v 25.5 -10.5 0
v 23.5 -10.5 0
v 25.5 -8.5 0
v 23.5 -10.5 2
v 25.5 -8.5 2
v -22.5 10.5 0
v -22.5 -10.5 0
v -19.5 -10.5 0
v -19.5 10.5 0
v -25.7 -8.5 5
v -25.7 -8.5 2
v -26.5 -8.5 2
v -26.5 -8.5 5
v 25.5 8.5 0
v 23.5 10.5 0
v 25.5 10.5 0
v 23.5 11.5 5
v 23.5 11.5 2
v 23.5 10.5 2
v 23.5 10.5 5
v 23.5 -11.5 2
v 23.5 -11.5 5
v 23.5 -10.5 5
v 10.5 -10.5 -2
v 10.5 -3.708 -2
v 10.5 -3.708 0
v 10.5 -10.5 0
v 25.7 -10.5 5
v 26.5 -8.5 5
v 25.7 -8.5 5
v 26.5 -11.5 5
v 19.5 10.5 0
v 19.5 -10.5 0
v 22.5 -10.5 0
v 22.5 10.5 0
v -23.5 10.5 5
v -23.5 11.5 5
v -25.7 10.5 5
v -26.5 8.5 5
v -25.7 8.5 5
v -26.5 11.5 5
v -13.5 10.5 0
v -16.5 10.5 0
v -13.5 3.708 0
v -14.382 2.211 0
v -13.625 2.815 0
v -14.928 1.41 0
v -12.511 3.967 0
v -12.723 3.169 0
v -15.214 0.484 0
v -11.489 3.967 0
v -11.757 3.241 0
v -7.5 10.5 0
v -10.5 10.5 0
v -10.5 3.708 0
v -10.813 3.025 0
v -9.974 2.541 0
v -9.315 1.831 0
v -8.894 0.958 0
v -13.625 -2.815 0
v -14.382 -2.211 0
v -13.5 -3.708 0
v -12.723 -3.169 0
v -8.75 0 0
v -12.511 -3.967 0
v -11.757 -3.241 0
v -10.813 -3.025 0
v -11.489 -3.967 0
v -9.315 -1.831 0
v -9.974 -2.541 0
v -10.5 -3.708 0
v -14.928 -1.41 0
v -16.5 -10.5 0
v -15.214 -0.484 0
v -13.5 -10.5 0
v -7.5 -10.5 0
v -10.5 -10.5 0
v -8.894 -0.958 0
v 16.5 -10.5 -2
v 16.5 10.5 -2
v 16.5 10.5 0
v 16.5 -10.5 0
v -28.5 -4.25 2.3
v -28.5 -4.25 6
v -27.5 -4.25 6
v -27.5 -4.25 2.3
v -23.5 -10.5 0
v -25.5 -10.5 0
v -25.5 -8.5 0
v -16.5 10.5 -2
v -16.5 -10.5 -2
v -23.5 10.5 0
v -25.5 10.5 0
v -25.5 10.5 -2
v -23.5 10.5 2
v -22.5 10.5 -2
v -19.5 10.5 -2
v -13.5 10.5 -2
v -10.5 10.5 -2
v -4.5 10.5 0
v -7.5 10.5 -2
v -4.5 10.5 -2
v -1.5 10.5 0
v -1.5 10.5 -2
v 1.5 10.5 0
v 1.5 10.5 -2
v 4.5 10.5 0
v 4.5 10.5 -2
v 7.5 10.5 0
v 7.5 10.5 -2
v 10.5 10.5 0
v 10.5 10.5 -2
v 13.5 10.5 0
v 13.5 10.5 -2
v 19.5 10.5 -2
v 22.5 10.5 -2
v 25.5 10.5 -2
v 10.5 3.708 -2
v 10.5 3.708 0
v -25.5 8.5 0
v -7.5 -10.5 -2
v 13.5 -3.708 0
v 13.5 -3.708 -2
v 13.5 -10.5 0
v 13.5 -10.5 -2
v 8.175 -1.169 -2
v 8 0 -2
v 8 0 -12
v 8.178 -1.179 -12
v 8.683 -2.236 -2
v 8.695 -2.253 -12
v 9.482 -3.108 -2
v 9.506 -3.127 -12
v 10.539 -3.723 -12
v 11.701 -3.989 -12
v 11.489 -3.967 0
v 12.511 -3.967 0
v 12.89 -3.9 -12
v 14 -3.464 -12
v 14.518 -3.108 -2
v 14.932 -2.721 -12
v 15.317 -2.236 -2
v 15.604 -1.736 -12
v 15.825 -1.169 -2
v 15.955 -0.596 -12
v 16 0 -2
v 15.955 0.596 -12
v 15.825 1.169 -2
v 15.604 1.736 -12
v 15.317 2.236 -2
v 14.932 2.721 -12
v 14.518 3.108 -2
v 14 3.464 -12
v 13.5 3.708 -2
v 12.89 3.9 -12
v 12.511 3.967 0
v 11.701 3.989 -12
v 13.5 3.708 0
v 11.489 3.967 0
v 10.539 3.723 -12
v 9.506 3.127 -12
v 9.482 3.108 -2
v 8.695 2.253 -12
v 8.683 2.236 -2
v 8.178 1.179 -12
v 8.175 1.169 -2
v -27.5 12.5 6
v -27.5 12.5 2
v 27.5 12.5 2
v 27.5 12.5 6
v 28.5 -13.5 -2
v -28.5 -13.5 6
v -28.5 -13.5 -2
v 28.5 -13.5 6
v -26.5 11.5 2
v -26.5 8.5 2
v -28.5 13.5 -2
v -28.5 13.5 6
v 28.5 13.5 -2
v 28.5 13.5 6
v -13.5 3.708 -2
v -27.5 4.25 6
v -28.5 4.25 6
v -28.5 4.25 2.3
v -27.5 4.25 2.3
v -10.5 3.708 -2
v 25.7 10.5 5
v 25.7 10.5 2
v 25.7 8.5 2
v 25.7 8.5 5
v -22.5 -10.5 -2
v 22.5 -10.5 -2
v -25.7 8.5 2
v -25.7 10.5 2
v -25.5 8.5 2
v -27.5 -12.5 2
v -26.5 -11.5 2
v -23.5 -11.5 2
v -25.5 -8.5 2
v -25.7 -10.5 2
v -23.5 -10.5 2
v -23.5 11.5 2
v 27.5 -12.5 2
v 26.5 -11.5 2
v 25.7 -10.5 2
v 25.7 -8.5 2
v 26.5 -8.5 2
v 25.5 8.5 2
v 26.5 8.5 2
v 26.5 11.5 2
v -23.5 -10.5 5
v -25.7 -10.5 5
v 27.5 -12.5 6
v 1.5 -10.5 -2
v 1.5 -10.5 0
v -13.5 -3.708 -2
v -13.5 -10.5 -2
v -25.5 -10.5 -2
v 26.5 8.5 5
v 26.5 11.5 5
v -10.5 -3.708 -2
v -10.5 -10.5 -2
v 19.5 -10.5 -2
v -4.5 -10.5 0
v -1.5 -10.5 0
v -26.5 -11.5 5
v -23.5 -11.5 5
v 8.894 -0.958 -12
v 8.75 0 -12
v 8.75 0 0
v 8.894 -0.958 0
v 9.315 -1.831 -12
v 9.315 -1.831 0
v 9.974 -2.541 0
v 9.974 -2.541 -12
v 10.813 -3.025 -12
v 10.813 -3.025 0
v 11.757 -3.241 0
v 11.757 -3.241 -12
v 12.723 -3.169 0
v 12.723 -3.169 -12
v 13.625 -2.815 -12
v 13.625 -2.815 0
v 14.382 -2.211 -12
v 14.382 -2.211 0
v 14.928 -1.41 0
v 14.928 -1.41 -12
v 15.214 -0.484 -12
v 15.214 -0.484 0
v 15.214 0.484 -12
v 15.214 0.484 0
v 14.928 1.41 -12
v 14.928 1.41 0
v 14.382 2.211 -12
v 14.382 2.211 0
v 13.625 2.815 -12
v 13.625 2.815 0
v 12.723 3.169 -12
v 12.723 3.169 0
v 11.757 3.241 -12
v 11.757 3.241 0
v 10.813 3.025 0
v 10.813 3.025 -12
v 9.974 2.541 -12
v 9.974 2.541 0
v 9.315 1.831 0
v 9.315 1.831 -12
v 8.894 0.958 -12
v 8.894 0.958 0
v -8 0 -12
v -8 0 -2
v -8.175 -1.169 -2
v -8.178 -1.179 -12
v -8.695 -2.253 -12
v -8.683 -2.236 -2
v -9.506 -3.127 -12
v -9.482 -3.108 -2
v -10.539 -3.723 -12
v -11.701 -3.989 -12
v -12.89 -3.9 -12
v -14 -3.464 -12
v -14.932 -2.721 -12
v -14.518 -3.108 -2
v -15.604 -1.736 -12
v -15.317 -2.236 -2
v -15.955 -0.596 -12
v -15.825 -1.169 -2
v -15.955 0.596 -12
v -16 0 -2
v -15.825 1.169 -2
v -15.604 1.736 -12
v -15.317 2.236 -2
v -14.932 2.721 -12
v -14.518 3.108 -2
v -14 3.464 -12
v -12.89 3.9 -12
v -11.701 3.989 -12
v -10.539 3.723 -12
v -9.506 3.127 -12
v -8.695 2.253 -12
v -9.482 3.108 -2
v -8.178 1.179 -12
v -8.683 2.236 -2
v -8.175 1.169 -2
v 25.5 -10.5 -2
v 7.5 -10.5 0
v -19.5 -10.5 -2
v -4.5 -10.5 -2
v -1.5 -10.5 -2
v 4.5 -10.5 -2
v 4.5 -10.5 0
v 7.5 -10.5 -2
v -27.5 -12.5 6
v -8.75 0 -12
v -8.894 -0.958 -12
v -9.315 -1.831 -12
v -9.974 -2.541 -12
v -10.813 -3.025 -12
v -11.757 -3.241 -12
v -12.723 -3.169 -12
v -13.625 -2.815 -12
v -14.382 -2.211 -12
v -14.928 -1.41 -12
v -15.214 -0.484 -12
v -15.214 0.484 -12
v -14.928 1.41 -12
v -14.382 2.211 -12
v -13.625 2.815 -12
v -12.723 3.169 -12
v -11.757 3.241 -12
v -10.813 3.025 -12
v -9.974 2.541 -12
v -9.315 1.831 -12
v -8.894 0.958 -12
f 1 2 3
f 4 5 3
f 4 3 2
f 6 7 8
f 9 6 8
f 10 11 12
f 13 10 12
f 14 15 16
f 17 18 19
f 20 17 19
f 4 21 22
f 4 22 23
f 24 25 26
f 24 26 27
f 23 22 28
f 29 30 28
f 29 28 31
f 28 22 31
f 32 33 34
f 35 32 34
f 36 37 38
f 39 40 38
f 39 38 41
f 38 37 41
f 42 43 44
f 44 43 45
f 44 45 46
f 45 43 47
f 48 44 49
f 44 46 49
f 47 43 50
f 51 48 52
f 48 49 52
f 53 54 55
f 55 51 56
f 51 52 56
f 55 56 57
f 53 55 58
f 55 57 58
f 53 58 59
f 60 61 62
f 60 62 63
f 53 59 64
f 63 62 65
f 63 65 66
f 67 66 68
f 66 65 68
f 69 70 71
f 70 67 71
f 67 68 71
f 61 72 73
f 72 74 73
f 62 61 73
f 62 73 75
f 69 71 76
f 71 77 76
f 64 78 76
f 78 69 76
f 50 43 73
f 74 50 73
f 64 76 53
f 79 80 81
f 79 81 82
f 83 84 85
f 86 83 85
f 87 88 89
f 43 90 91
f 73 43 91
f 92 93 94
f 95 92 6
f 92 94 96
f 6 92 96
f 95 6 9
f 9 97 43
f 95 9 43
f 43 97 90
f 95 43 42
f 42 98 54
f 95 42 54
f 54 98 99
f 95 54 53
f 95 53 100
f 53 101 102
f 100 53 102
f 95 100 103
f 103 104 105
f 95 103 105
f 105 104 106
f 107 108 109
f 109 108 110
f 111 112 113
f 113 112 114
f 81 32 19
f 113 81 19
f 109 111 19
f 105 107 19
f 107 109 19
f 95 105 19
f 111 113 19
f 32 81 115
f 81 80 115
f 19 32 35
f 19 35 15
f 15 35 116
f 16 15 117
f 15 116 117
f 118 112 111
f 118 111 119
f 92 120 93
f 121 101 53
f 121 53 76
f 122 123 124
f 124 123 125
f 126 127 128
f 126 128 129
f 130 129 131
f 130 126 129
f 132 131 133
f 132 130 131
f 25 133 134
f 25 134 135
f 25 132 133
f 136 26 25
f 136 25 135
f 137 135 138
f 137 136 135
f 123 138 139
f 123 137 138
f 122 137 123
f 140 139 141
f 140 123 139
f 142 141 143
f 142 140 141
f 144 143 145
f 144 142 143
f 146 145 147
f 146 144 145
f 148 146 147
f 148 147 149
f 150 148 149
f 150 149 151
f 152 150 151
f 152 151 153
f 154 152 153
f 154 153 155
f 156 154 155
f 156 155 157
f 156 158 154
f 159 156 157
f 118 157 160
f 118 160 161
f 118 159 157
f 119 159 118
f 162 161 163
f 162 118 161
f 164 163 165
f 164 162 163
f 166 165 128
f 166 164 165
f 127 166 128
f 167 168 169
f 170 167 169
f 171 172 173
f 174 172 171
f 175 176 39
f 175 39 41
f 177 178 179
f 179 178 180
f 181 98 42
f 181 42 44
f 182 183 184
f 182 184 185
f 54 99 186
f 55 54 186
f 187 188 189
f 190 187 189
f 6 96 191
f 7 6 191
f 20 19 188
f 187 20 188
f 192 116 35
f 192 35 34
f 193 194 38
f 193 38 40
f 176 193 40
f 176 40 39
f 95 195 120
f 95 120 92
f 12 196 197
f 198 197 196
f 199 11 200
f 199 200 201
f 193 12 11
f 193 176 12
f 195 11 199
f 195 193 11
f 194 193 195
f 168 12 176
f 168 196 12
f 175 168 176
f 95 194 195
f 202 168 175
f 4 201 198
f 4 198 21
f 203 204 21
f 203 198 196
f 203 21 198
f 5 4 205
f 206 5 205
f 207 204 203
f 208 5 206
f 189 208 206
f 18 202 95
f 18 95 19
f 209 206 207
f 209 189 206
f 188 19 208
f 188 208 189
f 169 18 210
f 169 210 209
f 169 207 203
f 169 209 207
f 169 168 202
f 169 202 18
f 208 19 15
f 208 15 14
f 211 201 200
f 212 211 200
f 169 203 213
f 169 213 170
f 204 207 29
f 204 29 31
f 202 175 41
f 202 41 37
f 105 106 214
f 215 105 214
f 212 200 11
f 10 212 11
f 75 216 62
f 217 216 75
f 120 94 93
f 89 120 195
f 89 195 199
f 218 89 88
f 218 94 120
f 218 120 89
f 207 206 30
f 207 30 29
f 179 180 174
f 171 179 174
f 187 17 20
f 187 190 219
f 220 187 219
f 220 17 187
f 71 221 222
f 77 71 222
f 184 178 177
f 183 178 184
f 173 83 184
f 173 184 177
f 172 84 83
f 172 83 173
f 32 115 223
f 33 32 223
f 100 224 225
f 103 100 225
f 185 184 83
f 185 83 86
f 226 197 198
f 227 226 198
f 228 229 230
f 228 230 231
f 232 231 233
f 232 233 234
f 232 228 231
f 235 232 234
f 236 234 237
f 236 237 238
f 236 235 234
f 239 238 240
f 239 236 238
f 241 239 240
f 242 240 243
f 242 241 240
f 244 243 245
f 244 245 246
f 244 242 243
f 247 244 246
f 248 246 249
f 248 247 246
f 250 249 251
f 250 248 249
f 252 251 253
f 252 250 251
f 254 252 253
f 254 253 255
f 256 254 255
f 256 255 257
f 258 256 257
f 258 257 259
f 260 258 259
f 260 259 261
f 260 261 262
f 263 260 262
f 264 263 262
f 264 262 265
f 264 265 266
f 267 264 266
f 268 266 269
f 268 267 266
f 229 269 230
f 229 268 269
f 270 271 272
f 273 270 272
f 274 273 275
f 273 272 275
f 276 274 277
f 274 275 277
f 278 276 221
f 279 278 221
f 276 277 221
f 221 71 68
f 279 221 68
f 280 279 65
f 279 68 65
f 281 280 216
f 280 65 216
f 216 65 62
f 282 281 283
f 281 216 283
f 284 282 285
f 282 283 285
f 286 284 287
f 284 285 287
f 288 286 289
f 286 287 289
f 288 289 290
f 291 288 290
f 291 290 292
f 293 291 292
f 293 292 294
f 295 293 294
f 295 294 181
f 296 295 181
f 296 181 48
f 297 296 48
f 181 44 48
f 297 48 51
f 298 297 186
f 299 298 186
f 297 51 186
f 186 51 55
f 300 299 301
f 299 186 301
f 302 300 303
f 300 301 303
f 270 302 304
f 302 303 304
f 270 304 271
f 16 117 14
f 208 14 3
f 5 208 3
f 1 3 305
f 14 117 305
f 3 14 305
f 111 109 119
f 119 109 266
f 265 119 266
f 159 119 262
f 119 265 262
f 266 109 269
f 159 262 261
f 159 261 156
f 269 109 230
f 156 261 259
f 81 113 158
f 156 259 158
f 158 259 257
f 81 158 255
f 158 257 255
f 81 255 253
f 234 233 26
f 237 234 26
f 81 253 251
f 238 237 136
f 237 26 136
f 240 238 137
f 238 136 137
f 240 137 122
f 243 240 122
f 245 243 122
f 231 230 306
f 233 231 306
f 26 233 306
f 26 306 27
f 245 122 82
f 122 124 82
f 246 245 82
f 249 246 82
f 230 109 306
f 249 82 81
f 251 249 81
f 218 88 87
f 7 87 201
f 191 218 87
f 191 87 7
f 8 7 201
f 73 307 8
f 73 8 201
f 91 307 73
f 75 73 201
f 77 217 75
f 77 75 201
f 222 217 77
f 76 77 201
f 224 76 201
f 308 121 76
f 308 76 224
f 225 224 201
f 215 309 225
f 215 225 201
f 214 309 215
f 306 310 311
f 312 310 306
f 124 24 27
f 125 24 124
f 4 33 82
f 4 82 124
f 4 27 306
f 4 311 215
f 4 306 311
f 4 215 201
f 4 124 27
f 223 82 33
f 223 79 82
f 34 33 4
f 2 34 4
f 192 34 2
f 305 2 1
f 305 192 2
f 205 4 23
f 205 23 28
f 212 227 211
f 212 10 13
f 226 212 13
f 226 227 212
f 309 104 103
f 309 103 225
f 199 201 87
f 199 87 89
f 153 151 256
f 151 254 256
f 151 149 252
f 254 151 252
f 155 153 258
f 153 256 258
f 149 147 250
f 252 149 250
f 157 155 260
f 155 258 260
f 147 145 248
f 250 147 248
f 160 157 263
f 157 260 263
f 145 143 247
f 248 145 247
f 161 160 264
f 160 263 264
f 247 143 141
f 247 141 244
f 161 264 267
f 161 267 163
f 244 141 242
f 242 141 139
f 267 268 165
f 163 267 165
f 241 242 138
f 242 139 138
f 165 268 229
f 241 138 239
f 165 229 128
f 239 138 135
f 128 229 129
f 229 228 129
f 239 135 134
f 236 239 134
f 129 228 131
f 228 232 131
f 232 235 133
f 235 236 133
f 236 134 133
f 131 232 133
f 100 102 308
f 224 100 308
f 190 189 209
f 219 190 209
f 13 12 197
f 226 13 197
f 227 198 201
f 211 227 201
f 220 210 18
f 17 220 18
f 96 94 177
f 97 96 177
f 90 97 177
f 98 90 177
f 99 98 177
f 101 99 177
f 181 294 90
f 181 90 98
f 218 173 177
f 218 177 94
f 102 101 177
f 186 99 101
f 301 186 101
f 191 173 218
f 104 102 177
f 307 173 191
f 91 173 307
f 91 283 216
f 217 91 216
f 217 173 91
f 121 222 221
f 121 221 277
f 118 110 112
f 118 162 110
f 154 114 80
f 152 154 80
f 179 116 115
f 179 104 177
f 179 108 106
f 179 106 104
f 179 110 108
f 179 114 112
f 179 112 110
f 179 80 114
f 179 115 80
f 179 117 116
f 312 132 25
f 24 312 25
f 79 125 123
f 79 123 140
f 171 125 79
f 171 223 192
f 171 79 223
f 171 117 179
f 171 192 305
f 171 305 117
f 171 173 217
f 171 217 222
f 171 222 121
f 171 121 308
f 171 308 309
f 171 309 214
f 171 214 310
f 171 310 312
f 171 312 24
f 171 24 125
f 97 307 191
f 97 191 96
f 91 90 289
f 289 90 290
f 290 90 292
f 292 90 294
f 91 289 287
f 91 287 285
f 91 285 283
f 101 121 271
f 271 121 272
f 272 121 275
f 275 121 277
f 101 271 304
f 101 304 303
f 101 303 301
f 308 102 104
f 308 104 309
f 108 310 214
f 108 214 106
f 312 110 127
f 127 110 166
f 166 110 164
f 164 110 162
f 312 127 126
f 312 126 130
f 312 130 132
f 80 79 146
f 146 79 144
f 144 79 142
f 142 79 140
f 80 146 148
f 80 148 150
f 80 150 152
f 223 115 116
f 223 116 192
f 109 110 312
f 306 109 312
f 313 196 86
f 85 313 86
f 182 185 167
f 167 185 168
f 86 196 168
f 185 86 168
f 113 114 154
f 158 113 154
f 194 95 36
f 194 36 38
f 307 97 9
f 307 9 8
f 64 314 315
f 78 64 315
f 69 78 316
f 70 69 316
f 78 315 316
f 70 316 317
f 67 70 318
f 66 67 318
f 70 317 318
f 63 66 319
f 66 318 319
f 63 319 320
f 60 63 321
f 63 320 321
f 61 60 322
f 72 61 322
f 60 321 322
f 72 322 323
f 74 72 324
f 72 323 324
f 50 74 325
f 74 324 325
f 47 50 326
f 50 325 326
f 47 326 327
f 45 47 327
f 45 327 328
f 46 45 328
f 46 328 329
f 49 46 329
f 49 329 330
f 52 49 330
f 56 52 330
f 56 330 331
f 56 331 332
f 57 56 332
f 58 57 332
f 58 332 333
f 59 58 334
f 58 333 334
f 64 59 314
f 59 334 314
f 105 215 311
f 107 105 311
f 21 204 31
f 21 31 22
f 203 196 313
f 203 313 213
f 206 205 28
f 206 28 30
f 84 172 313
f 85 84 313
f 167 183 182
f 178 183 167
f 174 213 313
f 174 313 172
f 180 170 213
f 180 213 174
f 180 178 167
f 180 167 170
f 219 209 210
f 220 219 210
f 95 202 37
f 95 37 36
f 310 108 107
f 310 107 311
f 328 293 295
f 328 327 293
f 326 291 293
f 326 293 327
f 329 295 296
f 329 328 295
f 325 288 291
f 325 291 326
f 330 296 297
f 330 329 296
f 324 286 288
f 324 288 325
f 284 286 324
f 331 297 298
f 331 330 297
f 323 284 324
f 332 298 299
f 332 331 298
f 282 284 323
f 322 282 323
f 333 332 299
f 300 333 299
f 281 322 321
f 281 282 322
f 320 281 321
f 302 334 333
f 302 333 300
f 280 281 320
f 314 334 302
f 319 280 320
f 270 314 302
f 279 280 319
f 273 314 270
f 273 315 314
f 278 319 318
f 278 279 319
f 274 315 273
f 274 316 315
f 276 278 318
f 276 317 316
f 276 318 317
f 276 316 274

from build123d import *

# Parameters (mm, degrees)
SKETCH_W                = 57
SKETCH_H                = 27
PAD_DEPTH               = 2
PAD001_DEPTH            = 3
PAD001_MIRRORED_2_DEPTH = 3
POCKET_DEPTH            = 2
SKETCH003_W             = 57
SKETCH003_H             = 27
SKETCH003_W_2           = 55
SKETCH003_H_2           = 25
PAD002_DEPTH            = 4
SKETCH004_W             = 1
SKETCH004_H             = 8.5
POCKET001_DEPTH         = 3.7
SKETCH005_W             = 57
SKETCH005_H             = 27
PAD003_DEPTH            = 2
SKETCH006_W             = 3
SKETCH006_H             = 21
POCKET002_DEPTH         = 2
LINEARPATTERN_COUNT     = 10
LINEARPATTERN_PITCH     = 6
SKETCH007_R             = 4
PAD004_DEPTH            = 12
SKETCH008_R             = 3.25
POCKET003_DEPTH         = 12


with BuildPart() as part:
    # Sketch → Pad (new body)
    with BuildSketch(Plane.XY):
        Rectangle(SKETCH_W, SKETCH_H)
    extrude(amount=PAD_DEPTH)

    # Sketch001 (on Face6 of Pad) → Pad001 (join)
    with BuildSketch(Plane.XY.offset(2)):
        Polygon((-26.5, 11.5), (-23.5, 11.5), (-23.5, 10.5), (-25.7, 10.5), (-25.7, 8.5), (-26.5, 8.5), align=None)
    pad001 = extrude(amount=PAD001_DEPTH)

    # Sketch001 Mirrored 2 → Pad001 Mirrored 2 (add)
    with BuildSketch(Plane(origin=(0, 0, 2), x_dir=(-1, 0, 0), z_dir=(0, 0, -1))):
        Polygon((-26.5, 11.5), (-23.5, 11.5), (-23.5, 10.5), (-25.7, 10.5), (-25.7, 8.5), (-26.5, 8.5), align=None)
    pad001_mirrored_2 = extrude(amount=-PAD001_MIRRORED_2_DEPTH)

    # Mirrored001: Pad001, Pad001 Mirrored 2 across Sketch001 H_Axis
    add(pad001.mirror(Plane(origin=(0, 0, 2), x_dir=(0, 0, 1), z_dir=(0, 1, 0))))
    add(pad001_mirrored_2.mirror(Plane(origin=(0, 0, 2), x_dir=(0, 0, 1), z_dir=(0, 1, 0))))

    # Sketch002 (on Face5 of MultiTransform) → Pocket (cut)
    with BuildSketch(Plane.XY.offset(2)):
        Polygon((23.5, 10.5), (25.5, 8.5), (25.5, -8.5), (23.5, -10.5), (-23.5, -10.5), (-25.5, -8.5), (-25.5, 8.5), (-23.5, 10.5), align=None)
    extrude(amount=-POCKET_DEPTH, mode=Mode.SUBTRACT)

    # Sketch003 (on Face5 of Pocket) → Pad002 (join)
    with BuildSketch(Plane.XY.offset(2)):
        Rectangle(SKETCH003_W, SKETCH003_H)
        Rectangle(SKETCH003_W_2, SKETCH003_H_2, mode=Mode.SUBTRACT)
    extrude(amount=PAD002_DEPTH)

    # Sketch004 (on Face17 of Pad002) → Pocket001 (cut)
    with BuildSketch(Plane.XY.offset(6)):
        with Locations((-28, 0)):
            Rectangle(SKETCH004_W, SKETCH004_H)
    extrude(amount=-POCKET001_DEPTH, mode=Mode.SUBTRACT)

    # Sketch005 (on Face4 of Pocket001) → Pad003 (join)
    with BuildSketch(Plane(origin=(0, 0, 0), x_dir=(1, 0, 0), z_dir=(0, 0, -1))):
        Rectangle(SKETCH005_W, SKETCH005_H)
    extrude(amount=PAD003_DEPTH)

    # Sketch006 (on Face11 of Pad003) → Pocket002 (cut)
    with BuildSketch(Plane(origin=(0, 0, -2), x_dir=(1, 0, 0), z_dir=(0, 0, -1))):
        with Locations((-24, 0)):
            Rectangle(SKETCH006_W, SKETCH006_H)
    pocket002 = extrude(amount=-POCKET002_DEPTH, mode=Mode.SUBTRACT)

    # LinearPattern: Pocket002 ×10
    with Locations(*[(i * LINEARPATTERN_PITCH, 0, 0) for i in range(1, LINEARPATTERN_COUNT)]):
        add(pocket002, mode=Mode.SUBTRACT)

    # Sketch007 (on Face62 of LinearPattern) → Pad004 (join)
    with BuildSketch(Plane(origin=(0, 0, 0), x_dir=(1, 0, 0), z_dir=(0, 0, -1))):
        with Locations((-12, 0)):
            Circle(SKETCH007_R)
    pad004 = extrude(amount=PAD004_DEPTH)

    # Sketch008 (on Face72 of Pad004) → Pocket003 (cut)
    with BuildSketch(Plane(origin=(0, 0, -12), x_dir=(1, 0, 0), z_dir=(0, 0, -1))):
        with Locations((-12, 0)):
            Circle(SKETCH008_R)
    pocket003 = extrude(amount=-POCKET003_DEPTH, mode=Mode.SUBTRACT)

    # Mirrored002: Pad004 across Sketch007 V_Axis
    add(pad004.mirror(Plane(origin=(0, 0, 0), x_dir=(0, 0, -1), z_dir=(1, 0, 0))))

    # Mirrored003: Pocket003 across Sketch008 V_Axis
    add(pocket003.mirror(Plane(origin=(0, 0, -12), x_dir=(0, 0, -1), z_dir=(1, 0, 0))), mode=Mode.SUBTRACT)


solid = part.part
